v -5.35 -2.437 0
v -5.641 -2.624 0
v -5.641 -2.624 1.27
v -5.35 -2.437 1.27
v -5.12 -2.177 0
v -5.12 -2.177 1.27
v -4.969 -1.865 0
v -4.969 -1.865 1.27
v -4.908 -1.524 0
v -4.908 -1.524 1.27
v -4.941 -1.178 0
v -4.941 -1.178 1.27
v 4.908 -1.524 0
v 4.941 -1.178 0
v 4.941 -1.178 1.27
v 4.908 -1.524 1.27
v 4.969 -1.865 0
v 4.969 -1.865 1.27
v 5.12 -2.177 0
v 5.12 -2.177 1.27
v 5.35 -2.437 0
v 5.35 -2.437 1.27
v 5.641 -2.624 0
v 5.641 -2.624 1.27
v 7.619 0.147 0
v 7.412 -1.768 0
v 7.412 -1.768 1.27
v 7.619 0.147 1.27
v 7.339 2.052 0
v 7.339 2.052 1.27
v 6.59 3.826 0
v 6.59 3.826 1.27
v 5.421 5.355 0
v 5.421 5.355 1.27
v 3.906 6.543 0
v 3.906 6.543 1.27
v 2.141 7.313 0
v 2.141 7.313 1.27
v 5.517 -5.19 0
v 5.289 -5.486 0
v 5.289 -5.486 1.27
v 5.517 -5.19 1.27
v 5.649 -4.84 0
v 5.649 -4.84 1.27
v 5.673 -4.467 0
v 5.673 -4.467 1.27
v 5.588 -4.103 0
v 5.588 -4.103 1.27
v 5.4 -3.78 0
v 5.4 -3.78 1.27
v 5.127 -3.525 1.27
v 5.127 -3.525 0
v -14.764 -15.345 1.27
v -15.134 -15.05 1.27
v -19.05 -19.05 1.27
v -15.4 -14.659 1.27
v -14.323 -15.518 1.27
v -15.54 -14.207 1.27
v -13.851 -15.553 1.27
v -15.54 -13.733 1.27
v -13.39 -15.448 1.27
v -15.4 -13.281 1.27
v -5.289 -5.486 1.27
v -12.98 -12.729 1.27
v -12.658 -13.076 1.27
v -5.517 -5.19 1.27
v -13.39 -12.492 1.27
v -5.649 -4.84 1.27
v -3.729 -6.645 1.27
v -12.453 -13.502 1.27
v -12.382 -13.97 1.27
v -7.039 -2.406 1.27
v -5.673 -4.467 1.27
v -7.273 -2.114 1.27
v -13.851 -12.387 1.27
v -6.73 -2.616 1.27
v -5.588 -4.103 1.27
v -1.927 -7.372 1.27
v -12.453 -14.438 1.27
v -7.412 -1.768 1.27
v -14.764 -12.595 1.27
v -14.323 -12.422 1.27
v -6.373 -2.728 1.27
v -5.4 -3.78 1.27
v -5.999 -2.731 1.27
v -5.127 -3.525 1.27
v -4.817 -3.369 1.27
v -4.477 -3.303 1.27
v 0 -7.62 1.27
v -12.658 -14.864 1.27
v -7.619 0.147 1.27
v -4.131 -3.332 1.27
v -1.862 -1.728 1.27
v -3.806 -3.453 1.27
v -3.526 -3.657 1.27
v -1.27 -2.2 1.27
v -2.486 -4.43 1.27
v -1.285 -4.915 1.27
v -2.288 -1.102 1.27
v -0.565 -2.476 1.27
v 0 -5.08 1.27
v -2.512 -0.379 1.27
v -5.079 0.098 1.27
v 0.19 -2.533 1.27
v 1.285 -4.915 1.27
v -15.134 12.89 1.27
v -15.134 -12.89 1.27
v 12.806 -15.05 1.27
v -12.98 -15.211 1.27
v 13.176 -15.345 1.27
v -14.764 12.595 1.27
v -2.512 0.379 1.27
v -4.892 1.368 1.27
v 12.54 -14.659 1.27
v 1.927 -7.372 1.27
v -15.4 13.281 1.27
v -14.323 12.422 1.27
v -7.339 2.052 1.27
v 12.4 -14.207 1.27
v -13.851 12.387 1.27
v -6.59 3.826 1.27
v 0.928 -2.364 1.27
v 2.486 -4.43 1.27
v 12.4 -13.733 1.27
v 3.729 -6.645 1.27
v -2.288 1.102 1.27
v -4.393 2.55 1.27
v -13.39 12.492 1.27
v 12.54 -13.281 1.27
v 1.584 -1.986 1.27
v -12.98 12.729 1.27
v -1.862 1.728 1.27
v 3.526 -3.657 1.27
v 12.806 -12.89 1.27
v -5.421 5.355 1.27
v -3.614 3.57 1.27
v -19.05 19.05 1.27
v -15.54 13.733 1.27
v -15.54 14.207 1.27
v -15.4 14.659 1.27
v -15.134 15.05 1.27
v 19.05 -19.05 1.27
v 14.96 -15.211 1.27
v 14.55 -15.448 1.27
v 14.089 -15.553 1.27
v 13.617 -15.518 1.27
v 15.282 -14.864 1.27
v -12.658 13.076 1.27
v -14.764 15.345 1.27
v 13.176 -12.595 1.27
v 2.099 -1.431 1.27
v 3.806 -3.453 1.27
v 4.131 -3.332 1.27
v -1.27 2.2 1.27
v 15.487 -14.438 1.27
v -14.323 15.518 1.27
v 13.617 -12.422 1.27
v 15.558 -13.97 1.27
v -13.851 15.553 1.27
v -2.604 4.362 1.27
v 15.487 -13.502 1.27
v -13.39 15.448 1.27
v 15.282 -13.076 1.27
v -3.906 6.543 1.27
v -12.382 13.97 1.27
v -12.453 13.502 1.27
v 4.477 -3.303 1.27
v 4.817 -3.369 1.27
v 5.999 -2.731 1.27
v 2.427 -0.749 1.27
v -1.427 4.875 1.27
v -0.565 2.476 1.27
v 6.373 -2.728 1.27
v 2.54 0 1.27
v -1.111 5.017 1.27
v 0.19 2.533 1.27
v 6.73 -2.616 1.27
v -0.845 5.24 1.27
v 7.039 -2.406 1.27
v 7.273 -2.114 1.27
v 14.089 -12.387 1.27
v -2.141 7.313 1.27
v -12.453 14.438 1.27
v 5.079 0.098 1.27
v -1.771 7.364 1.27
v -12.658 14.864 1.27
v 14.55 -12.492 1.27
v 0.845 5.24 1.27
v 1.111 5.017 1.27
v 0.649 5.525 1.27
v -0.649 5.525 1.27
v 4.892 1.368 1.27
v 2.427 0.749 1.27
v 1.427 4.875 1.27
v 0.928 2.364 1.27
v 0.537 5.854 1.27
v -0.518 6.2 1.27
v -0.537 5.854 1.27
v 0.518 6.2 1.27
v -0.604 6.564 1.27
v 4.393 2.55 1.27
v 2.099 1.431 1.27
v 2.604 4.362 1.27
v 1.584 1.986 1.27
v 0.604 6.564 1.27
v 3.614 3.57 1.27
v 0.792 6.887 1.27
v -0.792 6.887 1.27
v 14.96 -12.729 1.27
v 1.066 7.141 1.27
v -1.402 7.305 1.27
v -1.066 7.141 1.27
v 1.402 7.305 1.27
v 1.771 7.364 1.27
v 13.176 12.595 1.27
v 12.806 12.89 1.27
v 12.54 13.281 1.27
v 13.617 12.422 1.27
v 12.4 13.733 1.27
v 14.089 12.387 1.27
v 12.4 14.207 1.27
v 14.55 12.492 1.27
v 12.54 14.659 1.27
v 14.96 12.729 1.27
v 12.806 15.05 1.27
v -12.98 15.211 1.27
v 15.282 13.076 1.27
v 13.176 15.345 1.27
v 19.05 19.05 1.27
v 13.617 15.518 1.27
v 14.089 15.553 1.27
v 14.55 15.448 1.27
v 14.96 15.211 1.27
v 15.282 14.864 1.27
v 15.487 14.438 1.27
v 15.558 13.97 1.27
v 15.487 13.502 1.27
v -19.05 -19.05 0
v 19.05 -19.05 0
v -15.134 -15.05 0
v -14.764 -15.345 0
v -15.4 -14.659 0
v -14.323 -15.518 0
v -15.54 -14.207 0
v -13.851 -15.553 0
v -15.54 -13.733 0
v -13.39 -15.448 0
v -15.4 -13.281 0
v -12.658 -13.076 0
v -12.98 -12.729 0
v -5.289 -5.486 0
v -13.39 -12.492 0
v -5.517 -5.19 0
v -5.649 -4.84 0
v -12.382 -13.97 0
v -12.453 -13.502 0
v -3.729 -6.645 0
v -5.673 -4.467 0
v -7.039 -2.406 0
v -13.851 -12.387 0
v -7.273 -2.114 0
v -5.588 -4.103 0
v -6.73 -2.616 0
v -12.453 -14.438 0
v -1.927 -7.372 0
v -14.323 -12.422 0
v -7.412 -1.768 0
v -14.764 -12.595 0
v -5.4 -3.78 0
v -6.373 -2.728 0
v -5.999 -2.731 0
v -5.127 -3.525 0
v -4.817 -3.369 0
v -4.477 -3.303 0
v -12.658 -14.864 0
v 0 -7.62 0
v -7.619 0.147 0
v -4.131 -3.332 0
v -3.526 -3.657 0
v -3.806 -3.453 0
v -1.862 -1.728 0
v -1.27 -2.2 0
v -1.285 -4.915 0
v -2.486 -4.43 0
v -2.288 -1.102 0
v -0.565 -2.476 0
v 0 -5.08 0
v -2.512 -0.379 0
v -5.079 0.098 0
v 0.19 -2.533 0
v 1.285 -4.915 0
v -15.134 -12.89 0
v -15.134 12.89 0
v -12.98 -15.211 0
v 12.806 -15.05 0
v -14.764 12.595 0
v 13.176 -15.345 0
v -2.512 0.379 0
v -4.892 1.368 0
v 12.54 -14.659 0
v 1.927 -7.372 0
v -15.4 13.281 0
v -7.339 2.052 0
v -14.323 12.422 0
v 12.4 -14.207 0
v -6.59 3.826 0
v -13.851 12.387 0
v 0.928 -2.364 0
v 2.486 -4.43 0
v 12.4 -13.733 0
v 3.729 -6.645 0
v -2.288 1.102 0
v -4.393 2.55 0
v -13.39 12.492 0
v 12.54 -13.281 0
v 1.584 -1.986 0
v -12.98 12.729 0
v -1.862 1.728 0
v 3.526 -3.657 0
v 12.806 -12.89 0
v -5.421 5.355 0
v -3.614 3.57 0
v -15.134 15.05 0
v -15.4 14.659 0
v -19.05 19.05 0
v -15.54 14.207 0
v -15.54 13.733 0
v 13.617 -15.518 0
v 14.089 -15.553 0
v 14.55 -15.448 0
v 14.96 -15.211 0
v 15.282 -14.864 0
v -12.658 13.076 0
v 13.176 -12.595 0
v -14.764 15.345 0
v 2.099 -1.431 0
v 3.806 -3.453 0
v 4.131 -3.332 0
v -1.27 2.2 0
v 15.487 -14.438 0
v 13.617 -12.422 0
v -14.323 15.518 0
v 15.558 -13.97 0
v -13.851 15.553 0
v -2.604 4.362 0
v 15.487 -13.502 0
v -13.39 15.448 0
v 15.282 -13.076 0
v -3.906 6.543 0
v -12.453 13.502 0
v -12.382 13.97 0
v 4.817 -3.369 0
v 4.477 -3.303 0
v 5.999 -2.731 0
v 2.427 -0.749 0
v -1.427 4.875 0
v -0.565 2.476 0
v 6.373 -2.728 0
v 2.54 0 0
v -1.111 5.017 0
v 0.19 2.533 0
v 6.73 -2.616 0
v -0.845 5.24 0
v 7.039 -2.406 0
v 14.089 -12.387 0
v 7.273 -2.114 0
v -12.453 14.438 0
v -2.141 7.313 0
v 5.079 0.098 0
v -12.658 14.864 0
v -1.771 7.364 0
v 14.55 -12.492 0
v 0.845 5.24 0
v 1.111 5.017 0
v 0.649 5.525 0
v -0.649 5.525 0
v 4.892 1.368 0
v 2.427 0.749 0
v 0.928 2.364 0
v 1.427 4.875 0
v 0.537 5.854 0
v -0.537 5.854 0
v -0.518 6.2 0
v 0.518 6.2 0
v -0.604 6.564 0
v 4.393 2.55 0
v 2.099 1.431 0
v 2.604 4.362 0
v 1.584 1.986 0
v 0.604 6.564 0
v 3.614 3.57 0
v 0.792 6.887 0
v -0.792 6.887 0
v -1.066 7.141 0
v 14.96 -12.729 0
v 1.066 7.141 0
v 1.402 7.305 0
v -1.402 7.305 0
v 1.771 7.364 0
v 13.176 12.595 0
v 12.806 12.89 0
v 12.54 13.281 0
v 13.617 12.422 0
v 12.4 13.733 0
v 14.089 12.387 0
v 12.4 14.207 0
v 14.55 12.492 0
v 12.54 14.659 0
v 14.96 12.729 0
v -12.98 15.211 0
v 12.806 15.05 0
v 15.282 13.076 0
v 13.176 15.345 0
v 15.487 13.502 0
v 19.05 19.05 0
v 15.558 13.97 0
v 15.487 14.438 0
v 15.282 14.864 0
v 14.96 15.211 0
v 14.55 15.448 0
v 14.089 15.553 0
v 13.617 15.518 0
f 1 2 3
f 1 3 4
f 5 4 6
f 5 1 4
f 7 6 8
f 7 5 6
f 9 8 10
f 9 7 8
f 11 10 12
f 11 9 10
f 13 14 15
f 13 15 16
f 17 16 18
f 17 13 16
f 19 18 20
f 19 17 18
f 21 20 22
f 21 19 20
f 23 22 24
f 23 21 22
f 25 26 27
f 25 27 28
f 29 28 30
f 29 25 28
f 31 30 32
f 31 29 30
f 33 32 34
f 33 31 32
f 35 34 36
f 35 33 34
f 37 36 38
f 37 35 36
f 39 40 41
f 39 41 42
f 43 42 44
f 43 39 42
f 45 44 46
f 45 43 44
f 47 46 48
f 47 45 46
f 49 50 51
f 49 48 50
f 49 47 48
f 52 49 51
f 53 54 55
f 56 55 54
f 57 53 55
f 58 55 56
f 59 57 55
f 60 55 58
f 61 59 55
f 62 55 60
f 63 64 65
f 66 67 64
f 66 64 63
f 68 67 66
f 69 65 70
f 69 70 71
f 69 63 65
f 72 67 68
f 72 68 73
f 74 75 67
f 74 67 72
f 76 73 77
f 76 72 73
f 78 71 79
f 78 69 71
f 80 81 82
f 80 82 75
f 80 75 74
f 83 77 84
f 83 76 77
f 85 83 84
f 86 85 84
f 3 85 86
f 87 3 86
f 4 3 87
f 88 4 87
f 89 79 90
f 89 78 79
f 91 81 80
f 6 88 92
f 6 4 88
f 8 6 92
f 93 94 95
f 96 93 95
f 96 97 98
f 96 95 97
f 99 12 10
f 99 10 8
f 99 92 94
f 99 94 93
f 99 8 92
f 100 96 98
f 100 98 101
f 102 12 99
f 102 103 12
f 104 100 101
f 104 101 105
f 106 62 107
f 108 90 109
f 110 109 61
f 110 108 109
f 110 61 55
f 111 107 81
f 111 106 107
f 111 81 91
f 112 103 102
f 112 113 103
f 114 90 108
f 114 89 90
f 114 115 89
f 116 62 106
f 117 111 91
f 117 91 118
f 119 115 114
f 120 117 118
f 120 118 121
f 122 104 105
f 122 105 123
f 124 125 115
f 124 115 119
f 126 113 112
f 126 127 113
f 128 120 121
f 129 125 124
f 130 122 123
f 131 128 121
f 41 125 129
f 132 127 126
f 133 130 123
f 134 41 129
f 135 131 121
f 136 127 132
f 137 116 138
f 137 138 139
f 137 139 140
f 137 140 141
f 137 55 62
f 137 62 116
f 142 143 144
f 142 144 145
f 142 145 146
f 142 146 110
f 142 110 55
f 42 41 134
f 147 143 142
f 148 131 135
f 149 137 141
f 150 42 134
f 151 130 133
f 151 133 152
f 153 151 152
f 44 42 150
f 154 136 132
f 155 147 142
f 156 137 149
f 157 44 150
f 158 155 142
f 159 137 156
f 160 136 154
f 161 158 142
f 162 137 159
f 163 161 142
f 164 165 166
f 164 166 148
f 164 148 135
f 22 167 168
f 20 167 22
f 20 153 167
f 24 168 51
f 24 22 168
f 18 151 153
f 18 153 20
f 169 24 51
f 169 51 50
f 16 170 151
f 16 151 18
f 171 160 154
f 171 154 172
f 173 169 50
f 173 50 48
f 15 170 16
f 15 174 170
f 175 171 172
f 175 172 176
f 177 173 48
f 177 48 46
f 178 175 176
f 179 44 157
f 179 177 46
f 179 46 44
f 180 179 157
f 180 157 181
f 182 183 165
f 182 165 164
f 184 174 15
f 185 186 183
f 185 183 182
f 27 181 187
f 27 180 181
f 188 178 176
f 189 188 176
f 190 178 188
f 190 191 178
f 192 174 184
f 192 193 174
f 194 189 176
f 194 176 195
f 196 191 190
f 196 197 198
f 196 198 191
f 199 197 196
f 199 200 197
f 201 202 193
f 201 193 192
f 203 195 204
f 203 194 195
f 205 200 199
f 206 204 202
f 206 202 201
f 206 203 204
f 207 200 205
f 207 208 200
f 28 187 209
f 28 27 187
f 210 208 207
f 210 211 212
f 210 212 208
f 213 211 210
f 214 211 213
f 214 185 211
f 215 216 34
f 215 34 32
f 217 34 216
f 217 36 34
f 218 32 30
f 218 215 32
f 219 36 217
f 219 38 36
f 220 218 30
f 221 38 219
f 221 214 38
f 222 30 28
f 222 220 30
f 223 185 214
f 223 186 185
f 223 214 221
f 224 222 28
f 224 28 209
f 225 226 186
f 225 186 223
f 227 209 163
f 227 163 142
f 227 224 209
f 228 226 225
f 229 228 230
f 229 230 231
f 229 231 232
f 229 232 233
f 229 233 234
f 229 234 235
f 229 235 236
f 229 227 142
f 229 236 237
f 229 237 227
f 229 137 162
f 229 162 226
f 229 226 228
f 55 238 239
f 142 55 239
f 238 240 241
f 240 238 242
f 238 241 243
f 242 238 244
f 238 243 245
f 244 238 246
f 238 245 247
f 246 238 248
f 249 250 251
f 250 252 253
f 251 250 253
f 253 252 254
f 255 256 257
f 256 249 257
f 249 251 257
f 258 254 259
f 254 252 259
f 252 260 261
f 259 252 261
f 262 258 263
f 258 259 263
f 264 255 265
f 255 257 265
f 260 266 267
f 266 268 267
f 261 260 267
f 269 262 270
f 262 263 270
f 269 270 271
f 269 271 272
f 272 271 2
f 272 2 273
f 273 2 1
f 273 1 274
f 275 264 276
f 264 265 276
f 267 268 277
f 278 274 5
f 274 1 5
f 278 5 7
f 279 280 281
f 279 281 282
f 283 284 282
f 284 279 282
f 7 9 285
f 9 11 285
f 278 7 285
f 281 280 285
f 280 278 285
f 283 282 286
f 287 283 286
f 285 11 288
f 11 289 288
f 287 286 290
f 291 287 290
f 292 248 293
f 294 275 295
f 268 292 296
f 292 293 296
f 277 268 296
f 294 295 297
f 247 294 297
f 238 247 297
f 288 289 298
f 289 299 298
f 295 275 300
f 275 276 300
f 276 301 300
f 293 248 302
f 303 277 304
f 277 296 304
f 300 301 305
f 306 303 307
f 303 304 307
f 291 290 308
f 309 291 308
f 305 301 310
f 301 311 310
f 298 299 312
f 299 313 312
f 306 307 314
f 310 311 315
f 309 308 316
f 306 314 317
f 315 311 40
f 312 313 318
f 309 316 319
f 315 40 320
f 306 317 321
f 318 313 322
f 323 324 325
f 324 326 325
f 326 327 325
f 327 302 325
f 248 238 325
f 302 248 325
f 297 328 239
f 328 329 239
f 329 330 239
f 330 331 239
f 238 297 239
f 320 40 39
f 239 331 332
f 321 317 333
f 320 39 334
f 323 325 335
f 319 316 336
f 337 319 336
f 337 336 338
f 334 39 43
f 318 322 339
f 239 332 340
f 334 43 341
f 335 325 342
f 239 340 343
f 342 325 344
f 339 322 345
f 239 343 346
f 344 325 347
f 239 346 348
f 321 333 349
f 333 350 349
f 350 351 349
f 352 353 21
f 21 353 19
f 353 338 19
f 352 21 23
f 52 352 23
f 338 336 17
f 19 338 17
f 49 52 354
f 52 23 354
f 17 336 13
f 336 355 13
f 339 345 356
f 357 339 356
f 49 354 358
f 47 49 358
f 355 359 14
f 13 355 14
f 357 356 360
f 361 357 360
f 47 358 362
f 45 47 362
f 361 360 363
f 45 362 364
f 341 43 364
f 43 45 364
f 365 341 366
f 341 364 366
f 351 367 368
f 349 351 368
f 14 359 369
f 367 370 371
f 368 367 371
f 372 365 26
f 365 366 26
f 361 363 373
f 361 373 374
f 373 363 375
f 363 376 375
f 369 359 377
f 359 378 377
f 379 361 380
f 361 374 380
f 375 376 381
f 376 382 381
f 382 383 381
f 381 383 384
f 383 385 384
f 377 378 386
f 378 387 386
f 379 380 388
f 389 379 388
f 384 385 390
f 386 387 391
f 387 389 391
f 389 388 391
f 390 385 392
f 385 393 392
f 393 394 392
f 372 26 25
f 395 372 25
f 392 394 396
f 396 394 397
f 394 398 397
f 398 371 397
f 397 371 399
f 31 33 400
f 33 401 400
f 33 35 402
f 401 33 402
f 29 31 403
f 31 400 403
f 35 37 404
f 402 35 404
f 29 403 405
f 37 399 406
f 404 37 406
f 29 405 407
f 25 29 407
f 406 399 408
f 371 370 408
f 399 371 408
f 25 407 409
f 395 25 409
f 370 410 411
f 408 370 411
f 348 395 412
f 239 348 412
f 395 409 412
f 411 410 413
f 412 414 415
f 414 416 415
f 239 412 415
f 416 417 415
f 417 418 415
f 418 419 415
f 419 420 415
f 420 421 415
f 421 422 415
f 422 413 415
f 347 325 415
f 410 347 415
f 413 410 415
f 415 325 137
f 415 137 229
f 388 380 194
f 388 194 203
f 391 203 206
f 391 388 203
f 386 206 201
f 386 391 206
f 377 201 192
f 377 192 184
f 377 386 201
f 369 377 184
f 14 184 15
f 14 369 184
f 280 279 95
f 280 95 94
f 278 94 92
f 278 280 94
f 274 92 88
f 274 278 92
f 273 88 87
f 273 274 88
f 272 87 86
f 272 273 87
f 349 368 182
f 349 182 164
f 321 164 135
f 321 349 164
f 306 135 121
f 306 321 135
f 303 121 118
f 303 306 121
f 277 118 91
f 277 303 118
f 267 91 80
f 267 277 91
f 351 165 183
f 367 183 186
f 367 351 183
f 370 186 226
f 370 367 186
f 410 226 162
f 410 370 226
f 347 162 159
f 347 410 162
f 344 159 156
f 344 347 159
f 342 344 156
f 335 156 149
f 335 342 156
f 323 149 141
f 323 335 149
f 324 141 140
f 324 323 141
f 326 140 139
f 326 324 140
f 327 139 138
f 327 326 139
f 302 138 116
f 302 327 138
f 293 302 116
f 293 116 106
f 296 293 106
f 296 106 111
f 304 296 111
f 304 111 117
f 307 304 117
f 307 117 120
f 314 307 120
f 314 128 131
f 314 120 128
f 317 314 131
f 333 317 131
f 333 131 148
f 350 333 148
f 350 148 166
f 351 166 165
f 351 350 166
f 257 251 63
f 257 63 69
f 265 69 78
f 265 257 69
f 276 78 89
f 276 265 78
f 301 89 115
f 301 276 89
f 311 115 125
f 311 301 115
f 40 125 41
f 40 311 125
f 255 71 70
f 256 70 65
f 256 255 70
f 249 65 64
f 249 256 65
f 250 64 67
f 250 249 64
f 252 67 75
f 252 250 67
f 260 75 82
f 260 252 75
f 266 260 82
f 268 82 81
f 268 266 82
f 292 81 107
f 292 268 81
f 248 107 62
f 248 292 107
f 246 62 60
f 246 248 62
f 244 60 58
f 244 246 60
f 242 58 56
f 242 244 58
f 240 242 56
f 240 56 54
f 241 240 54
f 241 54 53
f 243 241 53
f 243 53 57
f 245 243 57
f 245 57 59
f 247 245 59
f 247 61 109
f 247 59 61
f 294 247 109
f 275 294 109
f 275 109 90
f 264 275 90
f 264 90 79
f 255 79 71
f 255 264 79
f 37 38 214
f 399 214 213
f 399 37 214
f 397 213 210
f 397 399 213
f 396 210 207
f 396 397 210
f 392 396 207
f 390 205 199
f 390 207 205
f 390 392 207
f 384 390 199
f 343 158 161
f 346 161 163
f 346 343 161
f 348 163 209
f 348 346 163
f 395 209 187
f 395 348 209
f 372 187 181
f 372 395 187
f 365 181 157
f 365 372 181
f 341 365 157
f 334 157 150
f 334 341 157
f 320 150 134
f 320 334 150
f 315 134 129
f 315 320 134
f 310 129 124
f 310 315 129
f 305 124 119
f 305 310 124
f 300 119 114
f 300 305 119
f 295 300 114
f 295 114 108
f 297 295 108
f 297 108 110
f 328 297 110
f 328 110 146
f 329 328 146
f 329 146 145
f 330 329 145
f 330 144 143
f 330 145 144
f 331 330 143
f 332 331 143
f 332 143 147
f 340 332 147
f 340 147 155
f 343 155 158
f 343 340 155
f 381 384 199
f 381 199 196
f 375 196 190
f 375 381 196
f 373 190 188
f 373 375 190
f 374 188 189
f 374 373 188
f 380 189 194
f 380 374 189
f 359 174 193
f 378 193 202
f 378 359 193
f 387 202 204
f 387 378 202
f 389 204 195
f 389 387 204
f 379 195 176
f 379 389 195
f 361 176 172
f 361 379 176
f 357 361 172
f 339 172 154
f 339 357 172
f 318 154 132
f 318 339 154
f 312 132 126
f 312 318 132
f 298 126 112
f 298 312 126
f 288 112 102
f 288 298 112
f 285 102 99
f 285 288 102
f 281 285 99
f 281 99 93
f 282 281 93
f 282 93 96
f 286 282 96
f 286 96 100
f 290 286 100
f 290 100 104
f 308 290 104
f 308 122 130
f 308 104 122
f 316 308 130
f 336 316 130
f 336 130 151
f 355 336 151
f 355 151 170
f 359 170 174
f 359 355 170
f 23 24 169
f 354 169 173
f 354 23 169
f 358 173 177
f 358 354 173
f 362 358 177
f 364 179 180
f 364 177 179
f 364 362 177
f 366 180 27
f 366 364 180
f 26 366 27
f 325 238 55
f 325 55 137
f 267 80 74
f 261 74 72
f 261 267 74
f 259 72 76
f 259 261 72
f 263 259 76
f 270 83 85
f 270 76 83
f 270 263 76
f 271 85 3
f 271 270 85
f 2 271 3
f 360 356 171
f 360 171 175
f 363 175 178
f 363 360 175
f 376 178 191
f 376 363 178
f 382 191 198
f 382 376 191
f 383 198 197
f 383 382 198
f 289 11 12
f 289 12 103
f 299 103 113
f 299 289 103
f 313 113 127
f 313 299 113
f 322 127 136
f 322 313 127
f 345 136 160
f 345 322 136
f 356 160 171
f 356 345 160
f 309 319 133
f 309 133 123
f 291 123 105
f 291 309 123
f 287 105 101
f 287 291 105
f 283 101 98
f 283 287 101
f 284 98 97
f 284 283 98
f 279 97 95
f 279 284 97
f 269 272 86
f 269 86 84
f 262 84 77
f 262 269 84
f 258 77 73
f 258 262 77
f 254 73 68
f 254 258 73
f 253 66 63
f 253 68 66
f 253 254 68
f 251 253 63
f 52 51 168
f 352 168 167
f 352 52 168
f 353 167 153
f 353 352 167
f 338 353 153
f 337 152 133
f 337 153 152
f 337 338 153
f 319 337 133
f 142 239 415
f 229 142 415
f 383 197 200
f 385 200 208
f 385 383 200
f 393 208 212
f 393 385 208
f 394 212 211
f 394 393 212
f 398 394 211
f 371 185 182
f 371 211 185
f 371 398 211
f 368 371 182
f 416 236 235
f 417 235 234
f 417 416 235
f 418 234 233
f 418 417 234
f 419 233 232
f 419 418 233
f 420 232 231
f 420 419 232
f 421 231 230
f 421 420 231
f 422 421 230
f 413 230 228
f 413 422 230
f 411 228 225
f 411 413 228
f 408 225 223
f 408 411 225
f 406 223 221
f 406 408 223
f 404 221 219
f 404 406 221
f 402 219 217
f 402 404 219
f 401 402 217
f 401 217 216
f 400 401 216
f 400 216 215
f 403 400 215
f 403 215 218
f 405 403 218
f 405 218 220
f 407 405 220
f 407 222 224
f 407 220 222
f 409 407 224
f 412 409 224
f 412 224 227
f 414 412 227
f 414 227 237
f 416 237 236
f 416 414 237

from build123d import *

# Parameters (mm, degrees)
F0_W     = 38.1
F0_H     = 38.1
F1_DEPTH = 1.27
F3_DEPTH = 25.4
F4_R     = 1.5875
F4_R_2   = 2.54
F5_DEPTH = 25.4


with BuildPart() as f1:
    # F0 (on Top) → F1 (new body)
    with BuildSketch(Plane.XY):
        Rectangle(F0_W, F0_H)
    extrude(amount=F1_DEPTH)

    # F2 (on Top) → F3 (cut)
    with BuildSketch(Plane.XY):
        with BuildLine():
            ThreePointArc((-0.518475, 6.200063), (-1.065611, 7.141481), (-2.14087, 7.313076))
            ThreePointArc((-2.14087, 7.313076), (-6.590117, 3.82554), (-7.412157, -1.767578))
            ThreePointArc((-7.412157, -1.767578), (-6.729914, -2.616206), (-5.641081, -2.624462))
            ThreePointArc((-5.641081, -2.624462), (-5.033573, -2.026098), (-4.941438, -1.178385))
            ThreePointArc((-4.941438, -1.178385), (-4.393411, 2.55036), (-1.427246, 4.875384))
            ThreePointArc((-1.427246, 4.875384), (-0.736807, 5.375783), (-0.518475, 6.200063))
        make_face()
        with BuildLine():
            ThreePointArc((5.641081, -2.624462), (6.729914, -2.616206), (7.412157, -1.767578))
            ThreePointArc((7.412157, -1.767578), (6.590117, 3.82554), (2.14087, 7.313076))
            ThreePointArc((2.14087, 7.313076), (1.065611, 7.141481), (0.518475, 6.200063))
            ThreePointArc((0.518475, 6.200063), (0.736807, 5.375783), (1.427246, 4.875384))
            ThreePointArc((1.427246, 4.875384), (4.393411, 2.55036), (4.941438, -1.178385))
            ThreePointArc((4.941438, -1.178385), (5.033573, -2.026098), (5.641081, -2.624462))
        make_face()
        with BuildLine():
            ThreePointArc((-5.126844, -3.524921), (-5.673013, -4.4669), (-5.288787, -5.485721))
            ThreePointArc((-5.288787, -5.485721), (0, -7.62), (5.288787, -5.485721))
            ThreePointArc((5.288787, -5.485721), (5.673013, -4.4669), (5.126844, -3.524921))
            ThreePointArc((5.126844, -3.524921), (4.302789, -3.305743), (3.525858, -3.657147))
            ThreePointArc((3.525858, -3.657147), (0, -5.08), (-3.525858, -3.657147))
            ThreePointArc((-3.525858, -3.657147), (-4.302789, -3.305743), (-5.126844, -3.524921))
        make_face()
    extrude(amount=F3_DEPTH, mode=Mode.SUBTRACT)

    # F4 (on Top) → F5 (cut)
    with BuildSketch(Plane.XY):
        with Locations((13.97, 13.97)):
            Circle(F4_R)
        with Locations((13.97, -13.97)):
            Circle(F4_R)
        with Locations((-13.97, -13.97)):
            Circle(F4_R)
        with Locations((-13.97, 13.97)):
            Circle(F4_R)
        Circle(F4_R_2)
    extrude(amount=F5_DEPTH, mode=Mode.SUBTRACT)


solid = f1.part
